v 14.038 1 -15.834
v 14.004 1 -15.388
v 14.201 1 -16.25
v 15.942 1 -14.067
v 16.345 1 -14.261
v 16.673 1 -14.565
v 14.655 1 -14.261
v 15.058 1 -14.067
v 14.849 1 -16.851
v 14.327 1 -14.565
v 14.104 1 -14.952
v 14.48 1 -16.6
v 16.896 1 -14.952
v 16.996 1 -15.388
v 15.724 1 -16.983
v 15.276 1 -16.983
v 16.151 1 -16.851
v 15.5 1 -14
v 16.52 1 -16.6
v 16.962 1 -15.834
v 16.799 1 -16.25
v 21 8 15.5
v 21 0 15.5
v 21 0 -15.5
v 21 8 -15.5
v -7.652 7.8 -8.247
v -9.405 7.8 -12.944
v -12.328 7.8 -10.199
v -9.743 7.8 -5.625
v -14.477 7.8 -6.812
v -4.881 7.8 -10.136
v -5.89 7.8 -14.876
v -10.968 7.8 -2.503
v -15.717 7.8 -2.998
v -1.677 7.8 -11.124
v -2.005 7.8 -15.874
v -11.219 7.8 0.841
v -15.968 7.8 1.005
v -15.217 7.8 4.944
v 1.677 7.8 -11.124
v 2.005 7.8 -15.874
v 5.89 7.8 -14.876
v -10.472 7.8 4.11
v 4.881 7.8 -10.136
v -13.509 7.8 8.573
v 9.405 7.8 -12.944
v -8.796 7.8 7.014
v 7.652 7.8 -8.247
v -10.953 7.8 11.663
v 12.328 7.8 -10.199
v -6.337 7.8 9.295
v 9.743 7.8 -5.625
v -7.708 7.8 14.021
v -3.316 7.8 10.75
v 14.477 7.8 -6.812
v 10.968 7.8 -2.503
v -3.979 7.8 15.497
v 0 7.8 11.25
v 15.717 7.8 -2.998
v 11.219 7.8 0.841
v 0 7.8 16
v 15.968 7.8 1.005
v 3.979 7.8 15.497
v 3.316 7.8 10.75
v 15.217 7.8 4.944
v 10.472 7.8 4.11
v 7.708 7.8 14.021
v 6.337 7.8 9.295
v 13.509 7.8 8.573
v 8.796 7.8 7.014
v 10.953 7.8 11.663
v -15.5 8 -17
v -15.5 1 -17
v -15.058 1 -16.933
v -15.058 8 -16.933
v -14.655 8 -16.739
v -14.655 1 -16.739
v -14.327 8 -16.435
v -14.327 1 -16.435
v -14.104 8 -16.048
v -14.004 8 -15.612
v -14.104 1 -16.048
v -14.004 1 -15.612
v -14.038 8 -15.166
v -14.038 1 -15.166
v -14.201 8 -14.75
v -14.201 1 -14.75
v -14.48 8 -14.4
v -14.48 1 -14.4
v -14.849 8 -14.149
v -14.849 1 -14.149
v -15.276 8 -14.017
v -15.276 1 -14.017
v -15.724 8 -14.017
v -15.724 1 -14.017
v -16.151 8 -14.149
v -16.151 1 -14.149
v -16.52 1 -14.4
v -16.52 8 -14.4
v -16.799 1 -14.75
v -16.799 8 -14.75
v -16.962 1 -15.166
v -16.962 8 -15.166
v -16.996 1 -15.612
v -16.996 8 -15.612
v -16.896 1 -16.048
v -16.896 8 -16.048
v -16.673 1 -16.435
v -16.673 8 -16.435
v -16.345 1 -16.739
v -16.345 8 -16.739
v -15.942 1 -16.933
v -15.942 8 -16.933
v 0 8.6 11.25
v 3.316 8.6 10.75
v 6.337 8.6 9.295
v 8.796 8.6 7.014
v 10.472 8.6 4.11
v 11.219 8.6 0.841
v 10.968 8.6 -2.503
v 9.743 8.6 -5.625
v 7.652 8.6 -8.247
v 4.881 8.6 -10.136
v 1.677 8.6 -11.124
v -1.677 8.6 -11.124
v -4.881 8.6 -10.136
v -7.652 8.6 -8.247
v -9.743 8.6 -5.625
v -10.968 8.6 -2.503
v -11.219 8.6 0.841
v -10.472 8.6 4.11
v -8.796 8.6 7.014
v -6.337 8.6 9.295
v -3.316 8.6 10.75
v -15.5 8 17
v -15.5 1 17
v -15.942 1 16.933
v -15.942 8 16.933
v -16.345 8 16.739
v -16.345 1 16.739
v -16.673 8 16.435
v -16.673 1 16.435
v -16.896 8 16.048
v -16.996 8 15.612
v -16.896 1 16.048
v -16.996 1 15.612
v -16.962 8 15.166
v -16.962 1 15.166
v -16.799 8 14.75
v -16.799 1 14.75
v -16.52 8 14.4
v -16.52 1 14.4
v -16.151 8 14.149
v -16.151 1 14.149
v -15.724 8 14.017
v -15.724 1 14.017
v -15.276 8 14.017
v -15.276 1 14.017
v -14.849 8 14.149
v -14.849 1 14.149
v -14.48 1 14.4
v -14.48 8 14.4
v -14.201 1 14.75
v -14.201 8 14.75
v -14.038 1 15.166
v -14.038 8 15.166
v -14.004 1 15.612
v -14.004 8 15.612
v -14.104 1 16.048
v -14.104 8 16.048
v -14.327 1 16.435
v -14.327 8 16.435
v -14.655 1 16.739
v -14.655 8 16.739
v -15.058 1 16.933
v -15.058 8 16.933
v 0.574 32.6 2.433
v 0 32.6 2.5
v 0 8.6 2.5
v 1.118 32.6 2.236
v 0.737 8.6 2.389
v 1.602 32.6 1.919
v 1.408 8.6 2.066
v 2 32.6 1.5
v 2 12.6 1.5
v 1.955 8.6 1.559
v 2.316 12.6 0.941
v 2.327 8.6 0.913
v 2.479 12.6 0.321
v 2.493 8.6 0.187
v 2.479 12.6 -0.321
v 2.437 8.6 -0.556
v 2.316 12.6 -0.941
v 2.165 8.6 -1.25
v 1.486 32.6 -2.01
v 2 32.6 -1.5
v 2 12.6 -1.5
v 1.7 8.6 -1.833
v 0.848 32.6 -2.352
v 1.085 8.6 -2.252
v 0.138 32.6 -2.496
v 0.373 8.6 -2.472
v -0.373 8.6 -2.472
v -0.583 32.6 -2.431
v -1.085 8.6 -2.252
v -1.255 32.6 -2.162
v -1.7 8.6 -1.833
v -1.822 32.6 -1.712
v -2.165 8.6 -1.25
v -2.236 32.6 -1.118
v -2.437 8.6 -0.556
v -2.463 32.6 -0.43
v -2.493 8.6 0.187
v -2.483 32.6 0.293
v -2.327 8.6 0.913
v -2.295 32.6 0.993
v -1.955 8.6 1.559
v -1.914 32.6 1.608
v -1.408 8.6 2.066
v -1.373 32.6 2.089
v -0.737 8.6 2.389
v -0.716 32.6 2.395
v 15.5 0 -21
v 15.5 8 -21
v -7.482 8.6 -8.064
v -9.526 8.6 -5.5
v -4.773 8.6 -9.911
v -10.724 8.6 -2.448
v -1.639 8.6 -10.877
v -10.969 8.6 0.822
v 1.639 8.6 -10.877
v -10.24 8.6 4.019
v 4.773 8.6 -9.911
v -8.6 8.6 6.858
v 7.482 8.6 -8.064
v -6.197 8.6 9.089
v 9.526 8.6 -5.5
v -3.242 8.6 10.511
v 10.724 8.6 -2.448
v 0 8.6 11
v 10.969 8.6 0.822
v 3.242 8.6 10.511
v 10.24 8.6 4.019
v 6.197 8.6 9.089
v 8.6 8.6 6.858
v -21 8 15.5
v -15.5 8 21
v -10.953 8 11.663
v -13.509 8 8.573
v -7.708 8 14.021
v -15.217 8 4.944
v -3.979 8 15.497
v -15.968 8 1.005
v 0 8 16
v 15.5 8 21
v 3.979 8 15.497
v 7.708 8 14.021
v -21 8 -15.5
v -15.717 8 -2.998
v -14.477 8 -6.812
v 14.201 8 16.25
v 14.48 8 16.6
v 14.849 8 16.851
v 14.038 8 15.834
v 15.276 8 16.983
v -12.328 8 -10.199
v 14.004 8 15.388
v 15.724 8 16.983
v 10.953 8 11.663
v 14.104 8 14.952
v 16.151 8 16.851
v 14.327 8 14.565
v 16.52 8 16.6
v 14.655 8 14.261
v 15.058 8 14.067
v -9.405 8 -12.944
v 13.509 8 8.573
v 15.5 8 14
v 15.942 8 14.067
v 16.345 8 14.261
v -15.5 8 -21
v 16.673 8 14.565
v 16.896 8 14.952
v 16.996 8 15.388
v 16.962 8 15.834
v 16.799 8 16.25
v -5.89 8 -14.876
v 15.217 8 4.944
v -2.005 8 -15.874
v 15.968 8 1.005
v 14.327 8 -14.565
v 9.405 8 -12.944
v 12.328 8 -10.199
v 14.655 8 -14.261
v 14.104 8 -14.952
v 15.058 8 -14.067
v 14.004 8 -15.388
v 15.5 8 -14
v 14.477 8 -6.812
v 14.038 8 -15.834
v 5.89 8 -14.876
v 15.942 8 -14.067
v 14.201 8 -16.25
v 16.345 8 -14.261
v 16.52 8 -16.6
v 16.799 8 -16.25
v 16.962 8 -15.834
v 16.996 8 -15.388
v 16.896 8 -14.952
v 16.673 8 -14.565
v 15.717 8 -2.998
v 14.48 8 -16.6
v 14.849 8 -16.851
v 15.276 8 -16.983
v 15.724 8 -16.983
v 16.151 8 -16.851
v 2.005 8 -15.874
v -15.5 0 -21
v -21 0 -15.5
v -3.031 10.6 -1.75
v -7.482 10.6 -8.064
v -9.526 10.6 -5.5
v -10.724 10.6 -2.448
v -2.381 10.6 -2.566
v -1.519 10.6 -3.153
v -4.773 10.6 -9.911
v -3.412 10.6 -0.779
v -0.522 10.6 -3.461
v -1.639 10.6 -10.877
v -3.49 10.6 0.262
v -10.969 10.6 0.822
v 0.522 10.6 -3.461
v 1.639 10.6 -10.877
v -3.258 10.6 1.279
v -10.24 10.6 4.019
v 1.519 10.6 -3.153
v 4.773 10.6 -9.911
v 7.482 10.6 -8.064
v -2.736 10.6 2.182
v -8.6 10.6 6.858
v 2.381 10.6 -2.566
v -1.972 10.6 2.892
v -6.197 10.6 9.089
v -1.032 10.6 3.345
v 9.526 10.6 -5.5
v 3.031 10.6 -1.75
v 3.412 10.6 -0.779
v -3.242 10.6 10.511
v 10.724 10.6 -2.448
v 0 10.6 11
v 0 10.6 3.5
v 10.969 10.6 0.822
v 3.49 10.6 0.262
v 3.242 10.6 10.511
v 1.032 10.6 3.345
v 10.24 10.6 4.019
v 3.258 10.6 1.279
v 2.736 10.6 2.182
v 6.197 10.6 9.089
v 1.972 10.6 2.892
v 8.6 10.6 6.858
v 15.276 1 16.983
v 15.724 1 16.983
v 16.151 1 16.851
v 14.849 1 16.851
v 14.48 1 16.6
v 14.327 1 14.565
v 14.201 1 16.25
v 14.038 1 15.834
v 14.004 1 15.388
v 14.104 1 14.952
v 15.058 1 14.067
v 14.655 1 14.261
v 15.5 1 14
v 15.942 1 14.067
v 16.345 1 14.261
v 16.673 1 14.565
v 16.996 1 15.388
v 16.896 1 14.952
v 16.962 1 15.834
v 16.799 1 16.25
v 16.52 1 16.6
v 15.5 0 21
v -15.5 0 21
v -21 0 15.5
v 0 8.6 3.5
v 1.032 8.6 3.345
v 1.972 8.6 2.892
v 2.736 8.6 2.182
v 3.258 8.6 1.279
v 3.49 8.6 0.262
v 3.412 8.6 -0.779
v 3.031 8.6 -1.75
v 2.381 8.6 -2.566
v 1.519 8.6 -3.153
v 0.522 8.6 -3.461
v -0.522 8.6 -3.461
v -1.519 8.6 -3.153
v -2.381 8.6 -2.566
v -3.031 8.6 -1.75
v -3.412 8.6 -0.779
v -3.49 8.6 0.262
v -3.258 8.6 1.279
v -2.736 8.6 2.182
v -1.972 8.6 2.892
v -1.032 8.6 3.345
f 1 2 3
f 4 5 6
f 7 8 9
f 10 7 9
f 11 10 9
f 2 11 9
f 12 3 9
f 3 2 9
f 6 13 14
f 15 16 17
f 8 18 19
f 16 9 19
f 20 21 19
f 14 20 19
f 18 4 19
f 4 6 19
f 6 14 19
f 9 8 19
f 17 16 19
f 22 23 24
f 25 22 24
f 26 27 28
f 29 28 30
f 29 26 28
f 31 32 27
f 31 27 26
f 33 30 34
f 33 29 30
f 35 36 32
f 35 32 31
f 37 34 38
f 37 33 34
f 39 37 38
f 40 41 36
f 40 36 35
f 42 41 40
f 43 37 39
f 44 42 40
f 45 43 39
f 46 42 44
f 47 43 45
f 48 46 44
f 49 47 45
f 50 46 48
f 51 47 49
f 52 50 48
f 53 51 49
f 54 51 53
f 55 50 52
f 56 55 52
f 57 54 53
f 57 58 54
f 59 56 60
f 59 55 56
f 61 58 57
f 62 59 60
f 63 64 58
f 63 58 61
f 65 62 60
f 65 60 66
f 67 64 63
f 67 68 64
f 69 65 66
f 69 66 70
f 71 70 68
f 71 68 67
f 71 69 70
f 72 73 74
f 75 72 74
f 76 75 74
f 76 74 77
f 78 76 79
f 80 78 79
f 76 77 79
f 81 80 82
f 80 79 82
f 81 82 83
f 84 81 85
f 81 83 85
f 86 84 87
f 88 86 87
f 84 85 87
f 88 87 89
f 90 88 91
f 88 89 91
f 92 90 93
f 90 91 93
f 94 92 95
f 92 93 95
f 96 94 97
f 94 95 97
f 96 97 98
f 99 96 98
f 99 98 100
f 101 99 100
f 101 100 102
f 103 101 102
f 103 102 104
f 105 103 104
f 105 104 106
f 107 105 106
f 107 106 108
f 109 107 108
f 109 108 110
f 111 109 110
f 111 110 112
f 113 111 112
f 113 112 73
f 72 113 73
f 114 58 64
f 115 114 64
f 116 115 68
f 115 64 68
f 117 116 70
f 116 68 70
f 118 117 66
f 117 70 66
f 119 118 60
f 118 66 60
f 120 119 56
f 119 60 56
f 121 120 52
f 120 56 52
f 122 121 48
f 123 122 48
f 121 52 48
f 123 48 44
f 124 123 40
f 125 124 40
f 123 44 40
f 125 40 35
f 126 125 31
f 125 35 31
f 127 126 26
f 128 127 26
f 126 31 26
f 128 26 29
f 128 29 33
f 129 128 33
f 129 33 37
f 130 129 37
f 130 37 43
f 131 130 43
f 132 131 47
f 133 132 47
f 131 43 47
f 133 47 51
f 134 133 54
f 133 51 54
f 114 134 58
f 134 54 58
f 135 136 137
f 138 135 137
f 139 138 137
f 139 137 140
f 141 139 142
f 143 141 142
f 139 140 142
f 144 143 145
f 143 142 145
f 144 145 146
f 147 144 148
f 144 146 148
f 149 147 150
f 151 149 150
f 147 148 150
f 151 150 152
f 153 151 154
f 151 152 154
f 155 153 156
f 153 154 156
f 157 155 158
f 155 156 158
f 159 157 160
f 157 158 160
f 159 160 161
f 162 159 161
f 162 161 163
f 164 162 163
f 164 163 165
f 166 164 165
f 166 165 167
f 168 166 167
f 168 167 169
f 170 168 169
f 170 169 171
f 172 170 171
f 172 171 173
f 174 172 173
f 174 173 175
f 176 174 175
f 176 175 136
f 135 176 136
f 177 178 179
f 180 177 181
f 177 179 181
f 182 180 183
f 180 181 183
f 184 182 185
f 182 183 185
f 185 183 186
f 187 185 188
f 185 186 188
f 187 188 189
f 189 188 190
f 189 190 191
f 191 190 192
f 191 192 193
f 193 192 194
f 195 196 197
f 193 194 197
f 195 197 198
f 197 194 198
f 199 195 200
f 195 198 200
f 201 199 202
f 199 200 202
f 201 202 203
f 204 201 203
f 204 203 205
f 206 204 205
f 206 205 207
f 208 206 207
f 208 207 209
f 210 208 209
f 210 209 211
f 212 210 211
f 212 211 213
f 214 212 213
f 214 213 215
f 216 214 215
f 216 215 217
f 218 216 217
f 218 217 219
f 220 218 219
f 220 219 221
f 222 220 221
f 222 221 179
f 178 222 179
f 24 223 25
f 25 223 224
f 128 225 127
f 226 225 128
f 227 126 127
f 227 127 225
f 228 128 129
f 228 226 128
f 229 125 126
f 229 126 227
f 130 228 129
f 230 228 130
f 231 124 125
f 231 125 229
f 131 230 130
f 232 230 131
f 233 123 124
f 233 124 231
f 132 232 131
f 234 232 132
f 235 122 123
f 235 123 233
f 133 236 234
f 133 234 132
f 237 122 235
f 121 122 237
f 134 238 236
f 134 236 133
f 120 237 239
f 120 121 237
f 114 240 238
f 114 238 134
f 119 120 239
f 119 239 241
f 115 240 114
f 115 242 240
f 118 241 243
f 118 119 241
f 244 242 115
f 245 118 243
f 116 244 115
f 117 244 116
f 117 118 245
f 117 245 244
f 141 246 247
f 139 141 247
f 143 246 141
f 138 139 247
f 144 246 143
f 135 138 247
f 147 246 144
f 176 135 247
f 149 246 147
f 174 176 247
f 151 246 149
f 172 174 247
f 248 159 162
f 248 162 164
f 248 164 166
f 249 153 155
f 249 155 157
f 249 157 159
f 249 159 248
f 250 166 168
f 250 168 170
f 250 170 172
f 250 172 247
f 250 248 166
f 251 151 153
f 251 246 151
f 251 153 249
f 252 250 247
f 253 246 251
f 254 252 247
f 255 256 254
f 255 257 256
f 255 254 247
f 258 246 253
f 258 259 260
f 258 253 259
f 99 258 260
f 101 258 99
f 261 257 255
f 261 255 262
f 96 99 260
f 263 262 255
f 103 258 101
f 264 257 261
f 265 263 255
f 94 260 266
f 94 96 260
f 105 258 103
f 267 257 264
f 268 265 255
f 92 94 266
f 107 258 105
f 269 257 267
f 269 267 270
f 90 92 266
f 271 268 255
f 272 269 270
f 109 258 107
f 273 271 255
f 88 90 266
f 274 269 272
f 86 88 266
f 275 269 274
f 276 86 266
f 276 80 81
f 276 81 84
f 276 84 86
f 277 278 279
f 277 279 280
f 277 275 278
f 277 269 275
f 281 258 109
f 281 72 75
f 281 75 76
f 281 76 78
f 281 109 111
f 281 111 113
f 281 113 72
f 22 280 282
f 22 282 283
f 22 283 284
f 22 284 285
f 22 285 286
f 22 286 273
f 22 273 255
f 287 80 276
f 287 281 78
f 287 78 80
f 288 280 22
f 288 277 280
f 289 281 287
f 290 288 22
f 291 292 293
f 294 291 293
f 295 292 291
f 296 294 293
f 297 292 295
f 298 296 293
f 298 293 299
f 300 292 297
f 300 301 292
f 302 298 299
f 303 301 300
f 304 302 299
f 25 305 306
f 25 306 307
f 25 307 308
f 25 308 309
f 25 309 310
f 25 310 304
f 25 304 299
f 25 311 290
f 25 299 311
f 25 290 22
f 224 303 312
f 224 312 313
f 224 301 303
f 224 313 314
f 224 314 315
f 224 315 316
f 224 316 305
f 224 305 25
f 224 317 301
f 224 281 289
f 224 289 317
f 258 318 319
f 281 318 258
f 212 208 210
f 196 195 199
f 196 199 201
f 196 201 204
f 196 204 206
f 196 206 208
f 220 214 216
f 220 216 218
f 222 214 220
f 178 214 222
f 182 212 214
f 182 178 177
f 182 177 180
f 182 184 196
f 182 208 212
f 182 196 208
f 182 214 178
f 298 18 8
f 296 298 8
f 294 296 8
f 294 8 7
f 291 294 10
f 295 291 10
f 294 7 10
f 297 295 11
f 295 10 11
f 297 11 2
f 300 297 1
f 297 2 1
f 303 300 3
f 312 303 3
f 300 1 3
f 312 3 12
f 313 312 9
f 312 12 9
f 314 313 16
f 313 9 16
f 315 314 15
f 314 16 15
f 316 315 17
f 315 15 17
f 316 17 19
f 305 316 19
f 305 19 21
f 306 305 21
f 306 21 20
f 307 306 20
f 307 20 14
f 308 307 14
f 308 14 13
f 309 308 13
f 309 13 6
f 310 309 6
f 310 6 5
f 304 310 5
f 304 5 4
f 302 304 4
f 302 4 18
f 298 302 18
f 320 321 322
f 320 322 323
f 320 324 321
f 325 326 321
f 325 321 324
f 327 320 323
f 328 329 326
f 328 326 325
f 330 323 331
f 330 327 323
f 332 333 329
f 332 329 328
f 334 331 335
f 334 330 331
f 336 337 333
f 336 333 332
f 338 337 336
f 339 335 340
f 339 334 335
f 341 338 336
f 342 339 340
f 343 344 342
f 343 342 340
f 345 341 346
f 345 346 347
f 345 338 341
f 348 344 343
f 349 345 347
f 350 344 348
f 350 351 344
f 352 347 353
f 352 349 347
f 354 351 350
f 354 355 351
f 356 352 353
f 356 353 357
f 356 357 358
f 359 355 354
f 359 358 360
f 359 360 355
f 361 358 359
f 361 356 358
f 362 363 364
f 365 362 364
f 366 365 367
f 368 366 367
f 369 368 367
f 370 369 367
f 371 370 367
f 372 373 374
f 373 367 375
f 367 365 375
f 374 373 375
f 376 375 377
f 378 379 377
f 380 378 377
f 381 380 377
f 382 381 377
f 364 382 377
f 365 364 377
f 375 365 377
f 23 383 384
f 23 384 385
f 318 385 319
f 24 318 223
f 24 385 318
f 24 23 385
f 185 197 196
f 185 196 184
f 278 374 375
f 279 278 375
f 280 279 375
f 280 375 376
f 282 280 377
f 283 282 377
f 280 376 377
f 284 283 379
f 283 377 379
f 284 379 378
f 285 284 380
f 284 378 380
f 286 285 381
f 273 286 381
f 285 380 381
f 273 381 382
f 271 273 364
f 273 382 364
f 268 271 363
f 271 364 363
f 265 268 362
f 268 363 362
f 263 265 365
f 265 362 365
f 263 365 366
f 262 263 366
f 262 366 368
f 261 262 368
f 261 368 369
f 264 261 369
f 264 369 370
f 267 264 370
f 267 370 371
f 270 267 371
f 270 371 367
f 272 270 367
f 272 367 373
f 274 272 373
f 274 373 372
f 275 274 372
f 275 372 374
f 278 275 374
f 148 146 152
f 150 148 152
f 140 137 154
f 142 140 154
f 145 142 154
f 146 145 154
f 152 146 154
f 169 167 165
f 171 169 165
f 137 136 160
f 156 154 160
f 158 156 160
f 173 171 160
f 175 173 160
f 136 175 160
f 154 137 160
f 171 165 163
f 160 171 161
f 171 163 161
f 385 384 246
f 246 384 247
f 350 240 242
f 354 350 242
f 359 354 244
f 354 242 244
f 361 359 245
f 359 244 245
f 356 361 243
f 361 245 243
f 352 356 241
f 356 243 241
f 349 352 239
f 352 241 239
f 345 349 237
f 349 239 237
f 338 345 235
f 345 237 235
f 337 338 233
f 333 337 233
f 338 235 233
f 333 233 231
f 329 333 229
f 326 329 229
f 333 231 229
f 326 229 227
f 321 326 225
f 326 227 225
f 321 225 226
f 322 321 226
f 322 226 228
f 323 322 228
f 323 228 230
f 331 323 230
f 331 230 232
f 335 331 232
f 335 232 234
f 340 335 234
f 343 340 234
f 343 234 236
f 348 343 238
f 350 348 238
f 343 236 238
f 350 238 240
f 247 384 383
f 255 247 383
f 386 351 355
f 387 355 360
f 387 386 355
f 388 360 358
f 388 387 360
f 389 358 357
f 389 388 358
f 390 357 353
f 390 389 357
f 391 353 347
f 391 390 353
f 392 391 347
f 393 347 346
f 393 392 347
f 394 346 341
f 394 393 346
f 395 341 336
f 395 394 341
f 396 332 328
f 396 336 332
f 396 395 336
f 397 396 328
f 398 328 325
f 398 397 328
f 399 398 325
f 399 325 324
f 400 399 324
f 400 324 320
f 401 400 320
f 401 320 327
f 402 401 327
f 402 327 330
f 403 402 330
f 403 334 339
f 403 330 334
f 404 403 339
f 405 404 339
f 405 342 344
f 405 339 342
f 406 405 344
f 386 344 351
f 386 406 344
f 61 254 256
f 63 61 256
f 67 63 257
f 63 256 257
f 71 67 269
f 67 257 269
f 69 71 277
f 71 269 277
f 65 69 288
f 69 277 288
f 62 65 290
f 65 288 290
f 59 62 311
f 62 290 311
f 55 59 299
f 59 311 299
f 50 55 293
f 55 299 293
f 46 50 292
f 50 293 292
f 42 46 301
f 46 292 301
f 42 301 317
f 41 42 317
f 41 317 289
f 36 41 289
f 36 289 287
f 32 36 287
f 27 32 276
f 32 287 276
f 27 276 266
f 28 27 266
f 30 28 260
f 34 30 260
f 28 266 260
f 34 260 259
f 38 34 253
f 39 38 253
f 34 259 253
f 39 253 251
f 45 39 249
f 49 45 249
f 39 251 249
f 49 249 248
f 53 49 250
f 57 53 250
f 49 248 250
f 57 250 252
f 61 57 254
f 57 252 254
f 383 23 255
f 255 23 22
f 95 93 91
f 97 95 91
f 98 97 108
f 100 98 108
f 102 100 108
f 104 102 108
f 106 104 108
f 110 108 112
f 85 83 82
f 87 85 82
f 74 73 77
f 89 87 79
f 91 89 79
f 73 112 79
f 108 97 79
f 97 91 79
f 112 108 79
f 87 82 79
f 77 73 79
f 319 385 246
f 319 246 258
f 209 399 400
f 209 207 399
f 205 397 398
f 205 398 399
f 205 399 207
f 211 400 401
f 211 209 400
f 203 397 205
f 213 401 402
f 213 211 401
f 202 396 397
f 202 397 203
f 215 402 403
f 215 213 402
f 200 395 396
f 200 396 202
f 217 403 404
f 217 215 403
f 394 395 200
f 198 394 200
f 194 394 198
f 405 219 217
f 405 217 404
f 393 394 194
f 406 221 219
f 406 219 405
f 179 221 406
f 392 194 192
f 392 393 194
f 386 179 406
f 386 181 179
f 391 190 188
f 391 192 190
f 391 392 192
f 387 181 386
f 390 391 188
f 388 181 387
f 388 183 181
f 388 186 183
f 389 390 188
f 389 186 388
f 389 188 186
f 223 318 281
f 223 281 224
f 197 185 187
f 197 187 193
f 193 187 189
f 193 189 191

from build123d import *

# Parameters (mm, degrees)
SKETCH1_W           = 42
SKETCH1_H           = 42
NEMA_17_DEPTH       = 8
CHAMFER1_SIZE       = 5.5
SKETCH2_R           = 1.5
M3_BOLT_HOLES_DEPTH = 31.757112998
SKETCH3_R           = 16
CUT_EXTRUDE1_DEPTH  = 0.2
SKETCH4_R           = 11.25
BOSS_EXTRUDE1_DEPTH = 0.8
SKETCH5_R           = 11
BOSS_EXTRUDE2_DEPTH = 2
SKETCH6_R           = 3.5
CUT_EXTRUDE2_DEPTH  = 31.918602814
SKETCH7_R           = 2.5
BOSS_EXTRUDE3_DEPTH = 24
CUT_EXTRUDE3_START  = -20
CUT_EXTRUDE3_DEPTH  = 20
SKETCH10_R          = 1.5
BOSS_EXTRUDE4_DEPTH = 1


with BuildPart() as part:
    # Sketch1 → Nema 17 (new body)
    with BuildSketch(Plane(origin=(0, 0, 0), x_dir=(1, 0, 0), z_dir=(0, 1, 0))):
        Rectangle(SKETCH1_W, SKETCH1_H)
    extrude(amount=NEMA_17_DEPTH)

    # Chamfer1
    chamfer1_edges = [part.edges().sort_by_distance(p)[0] for p in [
        (21, 4, 21),
        (-21, 4, 21),
        (-21, 4, -21),
        (21, 4, -21),
    ]]
    chamfer(chamfer1_edges, length=CHAMFER1_SIZE)

    # Sketch2 → M3 Bolt Holes (cut, through all)
    with BuildSketch(Plane.XZ):
        with Locations(Location((-15.5, -15.5, 0), (0, 0, 270))):
            Circle(SKETCH2_R)
        with Locations(Location((15.5, -15.5, 0), (0, 0, 90))):
            Circle(SKETCH2_R)
        with Locations(Location((-15.5, 15.5, 0), (0, 0, 90))):
            Circle(SKETCH2_R)
        with Locations(Location((15.5, 15.5, 0), (0, 0, 270))):
            Circle(SKETCH2_R)
    extrude(amount=-M3_BOLT_HOLES_DEPTH, mode=Mode.SUBTRACT)

    # Sketch3 → Cut-Extrude1 (cut)
    with BuildSketch(Plane(origin=(0, 8, 0), x_dir=(1, 0, 0), z_dir=(0, 1, 0))):
        with Locations(Location((0, 0, 0), (0, 0, 270))):
            Circle(SKETCH3_R)
    extrude(amount=-CUT_EXTRUDE1_DEPTH, mode=Mode.SUBTRACT)

    # Sketch4 → Boss-Extrude1 (add)
    with BuildSketch(Plane(origin=(0, 7.8, 0), x_dir=(1, 0, 0), z_dir=(0, 1, 0))):
        with Locations(Location((0, 0, 0), (0, 0, 270))):
            Circle(SKETCH4_R)
    extrude(amount=BOSS_EXTRUDE1_DEPTH)

    # Sketch5 → Boss-Extrude2 (add)
    with BuildSketch(Plane(origin=(0, 8.6, 0), x_dir=(1, 0, 0), z_dir=(0, 1, 0))):
        with Locations(Location((0, 0, 0), (0, 0, 270))):
            Circle(SKETCH5_R)
    extrude(amount=BOSS_EXTRUDE2_DEPTH)

    # Sketch6 → Cut-Extrude2 (cut, through all)
    with BuildSketch(Plane(origin=(0, 8.6, 0), x_dir=(1, 0, 0), z_dir=(0, 1, 0))):
        with Locations(Location((0, 0, 0), (0, 0, 270))):
            Circle(SKETCH6_R)
    extrude(amount=CUT_EXTRUDE2_DEPTH, mode=Mode.SUBTRACT)

    # Sketch7 → Boss-Extrude3 (add)
    with BuildSketch(Plane(origin=(0, 8.6, 0), x_dir=(1, 0, 0), z_dir=(0, 1, 0))):
        with Locations(Location((0, 0, 0), (0, 0, 270))):
            Circle(SKETCH7_R)
    extrude(amount=BOSS_EXTRUDE3_DEPTH)

    # Sketch9 → Cut-Extrude3 (cut)
    with BuildSketch(Plane(origin=(0, 32.6, 0), x_dir=(1, 0, 0), z_dir=(0, 1, 0)).offset(CUT_EXTRUDE3_START)):
        with BuildLine():
            Line((2, 1.5), (2, -1.5))
            ThreePointArc((2, -1.5), (2.5, 0), (2, 1.5))
        make_face()
    extrude(amount=CUT_EXTRUDE3_DEPTH, mode=Mode.SUBTRACT)

    # Sketch10 → Boss-Extrude4 (add)
    with BuildSketch(Plane.XZ):
        with Locations(Location((15.5, 15.5, 0), (0, 0, 270))):
            Circle(SKETCH10_R)
        with Locations(Location((-15.5, -15.5, 0), (0, 0, 270))):
            Circle(SKETCH10_R)
        with Locations(Location((15.5, -15.5, 0), (0, 0, 270))):
            Circle(SKETCH10_R)
        with Locations(Location((-15.5, 15.5, 0), (0, 0, 270))):
            Circle(SKETCH10_R)
    extrude(amount=-BOSS_EXTRUDE4_DEPTH)


solid = part.part
